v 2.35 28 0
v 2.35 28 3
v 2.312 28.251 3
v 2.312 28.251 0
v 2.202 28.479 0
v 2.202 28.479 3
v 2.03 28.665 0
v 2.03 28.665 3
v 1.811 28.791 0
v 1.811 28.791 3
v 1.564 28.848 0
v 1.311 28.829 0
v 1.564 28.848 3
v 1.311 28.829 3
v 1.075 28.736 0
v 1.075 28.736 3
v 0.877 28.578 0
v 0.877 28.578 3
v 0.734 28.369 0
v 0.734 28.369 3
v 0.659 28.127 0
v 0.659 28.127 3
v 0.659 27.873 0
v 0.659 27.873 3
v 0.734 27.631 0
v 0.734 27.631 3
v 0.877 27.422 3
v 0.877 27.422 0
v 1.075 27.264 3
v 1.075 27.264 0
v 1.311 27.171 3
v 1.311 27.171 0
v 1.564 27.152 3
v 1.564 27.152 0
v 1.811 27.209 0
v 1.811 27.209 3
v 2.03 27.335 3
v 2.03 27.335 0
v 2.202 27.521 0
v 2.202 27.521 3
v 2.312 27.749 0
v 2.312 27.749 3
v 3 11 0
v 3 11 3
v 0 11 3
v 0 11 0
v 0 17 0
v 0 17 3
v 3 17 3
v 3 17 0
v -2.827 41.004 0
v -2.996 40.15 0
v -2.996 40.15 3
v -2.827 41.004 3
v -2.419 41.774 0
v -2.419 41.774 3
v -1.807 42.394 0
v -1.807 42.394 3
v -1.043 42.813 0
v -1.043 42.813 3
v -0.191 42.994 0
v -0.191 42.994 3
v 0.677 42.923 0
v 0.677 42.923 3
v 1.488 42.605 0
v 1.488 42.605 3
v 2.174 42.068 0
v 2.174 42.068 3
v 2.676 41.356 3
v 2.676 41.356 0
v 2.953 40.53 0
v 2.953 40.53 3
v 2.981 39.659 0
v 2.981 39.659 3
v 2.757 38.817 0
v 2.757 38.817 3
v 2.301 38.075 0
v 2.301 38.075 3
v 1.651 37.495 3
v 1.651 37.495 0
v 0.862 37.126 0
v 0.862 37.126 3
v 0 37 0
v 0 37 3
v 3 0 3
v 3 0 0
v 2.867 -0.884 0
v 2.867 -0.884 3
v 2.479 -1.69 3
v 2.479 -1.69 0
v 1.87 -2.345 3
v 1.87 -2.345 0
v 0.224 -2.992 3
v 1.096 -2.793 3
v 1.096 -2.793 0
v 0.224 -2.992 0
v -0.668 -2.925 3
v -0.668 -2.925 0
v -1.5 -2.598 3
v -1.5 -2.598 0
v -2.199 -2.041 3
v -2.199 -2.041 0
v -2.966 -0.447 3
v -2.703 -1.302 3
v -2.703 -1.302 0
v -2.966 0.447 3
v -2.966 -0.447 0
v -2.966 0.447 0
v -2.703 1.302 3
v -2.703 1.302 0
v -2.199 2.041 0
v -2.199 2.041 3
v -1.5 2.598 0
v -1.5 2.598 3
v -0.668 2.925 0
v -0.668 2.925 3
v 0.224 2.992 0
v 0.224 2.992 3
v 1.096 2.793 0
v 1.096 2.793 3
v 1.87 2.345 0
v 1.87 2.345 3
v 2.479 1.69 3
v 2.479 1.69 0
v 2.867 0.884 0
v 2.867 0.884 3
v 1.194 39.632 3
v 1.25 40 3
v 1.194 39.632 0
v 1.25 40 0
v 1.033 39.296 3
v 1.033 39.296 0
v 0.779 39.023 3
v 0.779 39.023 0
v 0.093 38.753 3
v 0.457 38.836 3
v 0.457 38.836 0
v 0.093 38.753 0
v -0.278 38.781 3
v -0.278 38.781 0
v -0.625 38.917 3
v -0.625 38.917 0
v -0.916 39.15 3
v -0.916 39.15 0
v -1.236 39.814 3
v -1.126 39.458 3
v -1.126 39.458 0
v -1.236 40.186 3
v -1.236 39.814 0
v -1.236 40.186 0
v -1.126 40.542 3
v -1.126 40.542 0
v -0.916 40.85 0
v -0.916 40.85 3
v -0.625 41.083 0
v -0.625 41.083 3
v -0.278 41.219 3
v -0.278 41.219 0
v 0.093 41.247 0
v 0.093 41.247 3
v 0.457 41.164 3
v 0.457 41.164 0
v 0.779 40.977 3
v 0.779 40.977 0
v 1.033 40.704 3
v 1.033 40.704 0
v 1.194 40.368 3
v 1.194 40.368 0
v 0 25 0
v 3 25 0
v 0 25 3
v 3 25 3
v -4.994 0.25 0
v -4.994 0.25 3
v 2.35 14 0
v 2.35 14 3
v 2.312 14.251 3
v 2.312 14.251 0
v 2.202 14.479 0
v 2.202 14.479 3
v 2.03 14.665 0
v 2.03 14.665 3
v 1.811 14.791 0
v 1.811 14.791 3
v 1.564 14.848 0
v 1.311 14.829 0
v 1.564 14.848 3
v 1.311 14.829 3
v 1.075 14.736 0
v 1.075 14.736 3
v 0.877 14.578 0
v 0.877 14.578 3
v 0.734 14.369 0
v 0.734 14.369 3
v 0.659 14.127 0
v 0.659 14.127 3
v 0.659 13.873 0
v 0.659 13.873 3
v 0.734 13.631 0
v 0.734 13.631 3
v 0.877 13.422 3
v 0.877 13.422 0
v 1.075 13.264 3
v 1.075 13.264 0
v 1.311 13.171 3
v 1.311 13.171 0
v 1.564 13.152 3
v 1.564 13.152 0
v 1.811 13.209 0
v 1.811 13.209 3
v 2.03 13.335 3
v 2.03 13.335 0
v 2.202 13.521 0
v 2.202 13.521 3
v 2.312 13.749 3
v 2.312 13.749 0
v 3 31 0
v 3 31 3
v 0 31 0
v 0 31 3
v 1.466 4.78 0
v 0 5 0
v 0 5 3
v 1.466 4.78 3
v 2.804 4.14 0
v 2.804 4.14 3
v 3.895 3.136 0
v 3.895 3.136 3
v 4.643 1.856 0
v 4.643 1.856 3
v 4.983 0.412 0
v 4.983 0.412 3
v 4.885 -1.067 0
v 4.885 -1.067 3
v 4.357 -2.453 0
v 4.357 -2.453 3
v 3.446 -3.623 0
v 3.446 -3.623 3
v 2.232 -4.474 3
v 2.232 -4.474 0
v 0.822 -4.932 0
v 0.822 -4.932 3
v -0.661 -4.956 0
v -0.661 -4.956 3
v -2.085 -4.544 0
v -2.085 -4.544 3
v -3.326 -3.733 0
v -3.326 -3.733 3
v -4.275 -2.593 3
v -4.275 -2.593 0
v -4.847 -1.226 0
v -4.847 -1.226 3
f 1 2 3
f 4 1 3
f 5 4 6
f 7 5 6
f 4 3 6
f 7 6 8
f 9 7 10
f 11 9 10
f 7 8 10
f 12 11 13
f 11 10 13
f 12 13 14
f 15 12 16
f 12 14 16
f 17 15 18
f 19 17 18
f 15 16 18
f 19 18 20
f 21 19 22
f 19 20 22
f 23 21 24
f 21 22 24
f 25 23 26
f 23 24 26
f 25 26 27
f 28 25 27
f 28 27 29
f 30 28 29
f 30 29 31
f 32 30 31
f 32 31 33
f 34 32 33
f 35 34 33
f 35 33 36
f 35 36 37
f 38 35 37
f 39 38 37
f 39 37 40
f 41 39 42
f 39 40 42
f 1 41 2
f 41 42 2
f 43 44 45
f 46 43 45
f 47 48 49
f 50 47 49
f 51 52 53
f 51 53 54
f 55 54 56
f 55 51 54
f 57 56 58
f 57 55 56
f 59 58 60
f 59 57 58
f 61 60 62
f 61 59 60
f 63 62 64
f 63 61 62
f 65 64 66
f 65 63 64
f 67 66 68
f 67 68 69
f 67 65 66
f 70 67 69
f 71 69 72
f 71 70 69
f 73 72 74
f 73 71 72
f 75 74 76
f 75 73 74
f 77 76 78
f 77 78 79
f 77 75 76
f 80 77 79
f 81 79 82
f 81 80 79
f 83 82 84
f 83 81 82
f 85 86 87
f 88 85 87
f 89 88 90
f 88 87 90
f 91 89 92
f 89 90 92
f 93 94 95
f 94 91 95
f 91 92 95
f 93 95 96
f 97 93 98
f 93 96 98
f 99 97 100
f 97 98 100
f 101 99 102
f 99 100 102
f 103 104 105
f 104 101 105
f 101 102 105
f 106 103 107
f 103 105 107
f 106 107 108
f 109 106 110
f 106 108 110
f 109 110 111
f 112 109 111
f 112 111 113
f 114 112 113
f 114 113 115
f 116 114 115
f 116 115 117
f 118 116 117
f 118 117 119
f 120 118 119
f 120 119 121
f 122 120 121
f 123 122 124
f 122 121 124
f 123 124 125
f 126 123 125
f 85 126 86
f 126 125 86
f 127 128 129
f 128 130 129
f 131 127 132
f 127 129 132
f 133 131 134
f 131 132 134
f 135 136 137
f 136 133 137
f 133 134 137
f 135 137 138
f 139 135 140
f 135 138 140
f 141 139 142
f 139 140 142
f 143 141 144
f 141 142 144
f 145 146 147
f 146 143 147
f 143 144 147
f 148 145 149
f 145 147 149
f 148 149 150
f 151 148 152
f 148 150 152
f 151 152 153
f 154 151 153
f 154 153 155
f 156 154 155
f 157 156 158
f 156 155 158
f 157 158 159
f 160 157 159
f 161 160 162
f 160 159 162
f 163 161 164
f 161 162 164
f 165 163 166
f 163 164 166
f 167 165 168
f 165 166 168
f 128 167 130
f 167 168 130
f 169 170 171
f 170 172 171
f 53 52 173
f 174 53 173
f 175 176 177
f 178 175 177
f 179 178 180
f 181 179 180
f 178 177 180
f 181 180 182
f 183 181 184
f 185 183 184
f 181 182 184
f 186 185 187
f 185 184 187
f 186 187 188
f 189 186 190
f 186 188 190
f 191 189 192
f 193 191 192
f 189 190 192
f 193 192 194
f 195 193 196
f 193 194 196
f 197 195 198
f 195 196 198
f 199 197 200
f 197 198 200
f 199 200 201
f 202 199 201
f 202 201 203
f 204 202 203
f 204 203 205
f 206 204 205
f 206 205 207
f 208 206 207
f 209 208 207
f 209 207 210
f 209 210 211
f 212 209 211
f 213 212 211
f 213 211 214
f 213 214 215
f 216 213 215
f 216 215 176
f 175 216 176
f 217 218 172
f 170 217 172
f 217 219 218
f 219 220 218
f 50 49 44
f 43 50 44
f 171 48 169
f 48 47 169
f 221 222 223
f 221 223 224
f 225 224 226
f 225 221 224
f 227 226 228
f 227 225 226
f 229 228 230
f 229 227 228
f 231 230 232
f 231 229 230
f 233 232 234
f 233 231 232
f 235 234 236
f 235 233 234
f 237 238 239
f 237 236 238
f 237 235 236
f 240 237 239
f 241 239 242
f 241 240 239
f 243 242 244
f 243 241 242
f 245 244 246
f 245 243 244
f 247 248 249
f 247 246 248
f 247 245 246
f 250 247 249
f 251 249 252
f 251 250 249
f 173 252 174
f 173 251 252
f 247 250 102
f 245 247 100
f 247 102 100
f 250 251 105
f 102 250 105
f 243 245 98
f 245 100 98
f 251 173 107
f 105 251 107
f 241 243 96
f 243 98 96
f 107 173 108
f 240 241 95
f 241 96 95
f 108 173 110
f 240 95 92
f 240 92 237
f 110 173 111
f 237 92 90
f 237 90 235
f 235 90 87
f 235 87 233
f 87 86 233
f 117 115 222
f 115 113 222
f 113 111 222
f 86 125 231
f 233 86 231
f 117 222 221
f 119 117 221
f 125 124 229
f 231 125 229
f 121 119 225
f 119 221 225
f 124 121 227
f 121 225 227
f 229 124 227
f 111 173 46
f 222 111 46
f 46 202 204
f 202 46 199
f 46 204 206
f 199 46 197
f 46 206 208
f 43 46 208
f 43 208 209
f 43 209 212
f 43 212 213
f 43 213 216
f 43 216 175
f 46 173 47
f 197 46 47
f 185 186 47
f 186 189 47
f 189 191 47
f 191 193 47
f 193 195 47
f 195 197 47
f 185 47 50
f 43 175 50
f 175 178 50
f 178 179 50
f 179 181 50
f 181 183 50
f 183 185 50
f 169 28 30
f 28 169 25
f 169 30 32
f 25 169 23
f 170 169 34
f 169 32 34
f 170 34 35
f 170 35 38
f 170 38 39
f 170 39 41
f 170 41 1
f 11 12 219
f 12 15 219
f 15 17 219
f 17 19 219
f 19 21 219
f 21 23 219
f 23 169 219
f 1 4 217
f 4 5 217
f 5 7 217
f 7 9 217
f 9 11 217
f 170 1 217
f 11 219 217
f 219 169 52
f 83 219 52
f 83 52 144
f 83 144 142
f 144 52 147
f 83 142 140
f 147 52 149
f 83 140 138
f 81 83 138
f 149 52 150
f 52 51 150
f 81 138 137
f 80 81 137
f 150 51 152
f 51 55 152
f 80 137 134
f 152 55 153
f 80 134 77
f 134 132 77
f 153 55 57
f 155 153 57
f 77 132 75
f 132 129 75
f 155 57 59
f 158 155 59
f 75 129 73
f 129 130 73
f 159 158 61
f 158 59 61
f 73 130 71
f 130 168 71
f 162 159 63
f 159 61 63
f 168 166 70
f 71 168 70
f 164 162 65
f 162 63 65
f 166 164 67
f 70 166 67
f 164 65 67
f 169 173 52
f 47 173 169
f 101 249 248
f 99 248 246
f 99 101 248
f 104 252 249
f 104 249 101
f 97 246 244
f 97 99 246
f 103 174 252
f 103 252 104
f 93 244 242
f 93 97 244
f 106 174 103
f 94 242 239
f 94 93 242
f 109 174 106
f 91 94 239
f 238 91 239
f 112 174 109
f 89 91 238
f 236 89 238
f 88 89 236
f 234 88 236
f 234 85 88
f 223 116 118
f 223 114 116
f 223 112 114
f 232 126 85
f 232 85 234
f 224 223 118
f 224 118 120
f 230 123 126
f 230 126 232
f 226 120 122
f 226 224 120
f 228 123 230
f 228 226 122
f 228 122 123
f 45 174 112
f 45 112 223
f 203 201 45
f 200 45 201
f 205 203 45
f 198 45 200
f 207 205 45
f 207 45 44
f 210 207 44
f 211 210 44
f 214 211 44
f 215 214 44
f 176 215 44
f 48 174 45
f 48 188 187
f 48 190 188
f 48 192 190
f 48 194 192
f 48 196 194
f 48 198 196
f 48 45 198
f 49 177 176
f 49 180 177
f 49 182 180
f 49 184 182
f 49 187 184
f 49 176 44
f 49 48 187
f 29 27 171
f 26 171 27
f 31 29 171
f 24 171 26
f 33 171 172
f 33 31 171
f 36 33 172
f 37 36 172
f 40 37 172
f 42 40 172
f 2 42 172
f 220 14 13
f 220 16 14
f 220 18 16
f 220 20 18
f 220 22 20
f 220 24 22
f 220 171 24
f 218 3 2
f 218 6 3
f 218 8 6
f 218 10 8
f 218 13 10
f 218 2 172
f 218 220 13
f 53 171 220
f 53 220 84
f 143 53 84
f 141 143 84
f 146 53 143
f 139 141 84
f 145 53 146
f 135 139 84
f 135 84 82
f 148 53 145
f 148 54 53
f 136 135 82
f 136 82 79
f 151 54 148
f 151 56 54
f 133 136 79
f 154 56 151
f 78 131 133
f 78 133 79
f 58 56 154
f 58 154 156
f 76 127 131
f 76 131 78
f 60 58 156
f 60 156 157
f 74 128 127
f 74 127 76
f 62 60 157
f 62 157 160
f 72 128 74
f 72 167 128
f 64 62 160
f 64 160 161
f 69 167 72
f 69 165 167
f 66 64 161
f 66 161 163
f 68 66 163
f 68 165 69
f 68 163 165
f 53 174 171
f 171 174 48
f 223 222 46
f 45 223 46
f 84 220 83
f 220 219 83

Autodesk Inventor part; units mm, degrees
ref_plane "YZ Plane" through (0, 0, 0) normal (1, 0, 0) x (0, 1, 0)
ref_plane "XZ Plane" through (0, 0, 0) normal (0, 1, 0) x (-1, 0, 0)
ref_plane "XY Plane" through (0, 0, 0) normal (0, 0, 1) x (1, 0, 0)
sketch "スケッチ1" plane through (0, 0, 0) normal (0, 0, 1) x (1, 0, 0)
  circle A0 centre (0, 0) radius 3
  circle A1 centre (0, 40) radius 1.25
  circle A2 centre (0, 40) radius 3
  circle A3 centre (0, 0) radius 5
  line L0 (0, 5) -> (0, 37)
  line L1 (-2.9962, 40.15) -> (-4.9937, 0.25)
  dimension "d0" = 6
  dimension "d1" = 2.5
  dimension "d2" = 40
  dimension "d3" = 6
  dimension "d4" = 10
extrude "押し出し1" add sketch "スケッチ1" along normal blind 3
sketch "スケッチ2" plane through (0, 0, 3) normal (0, 0, 1) x (1, 0, 0)
  circle A0 centre (0, 0) radius 3 projected
  circle A1 centre (0, 40) radius 1.25 projected
  arc A2 (0, 37) -> (-2.9962, 40.15) centre (0, 40) ccw projected
  line L0 (-2.9962, 40.15) -> (-4.9937, 0.25) projected
  arc A3 (-4.9937, 0.25) -> (0, 5) centre (0, 0) ccw projected
  line L1 (0, 5) -> (0, 37) projected
  circle A4 centre (0, 0) radius 3
  circle A5 centre (-32.1289, 23.8272) radius 1.25
  line L2 (-4.0161, 2.9784) -> (-4.827, 3.5798)
  arc A6 (-30.4645, 26.3232) -> (-29.7192, 22.0402) centre (-32.1289, 23.8272) ccw
  line L3 (-4.5534, 9.0458) -> (2.7739, 4.16)
  arc A7 (-4.0161, 2.9784) -> (2.7739, 4.16) centre (0, 0) ccw
extrude "押し出し2" [suppressed]
sketch "スケッチ4" plane through (0, 0, 3) normal (0, 0, 1) x (1, 0, 0)
  line L0 (-4.9937, 0.25) -> (-2.9962, 40.15) projected
  arc A0 (0, 37) -> (-2.9962, 40.15) centre (0, 40) ccw projected
  line L1 (0, 37) -> (0, 5) projected
  circle A1 centre (0, 40) radius 1.25 projected
  circle A2 centre (-27.9404, 11.376) radius 3
  circle A3 centre (0, 40) radius 1.25
  line L2 (-3.1661, 36.7564) -> (-2.0955, 37.8532)
  arc A4 (2.2489, 38.0144) -> (-2.0955, 37.8532) centre (0, 40) ccw
  line L3 (2.2489, 38.0144) -> (-3.4249, 31.5882)
  arc A5 (-24.4479, 14.954) -> (-24.1923, 8.0667) centre (-27.9404, 11.376) ccw
  circle A6 centre (0, 0) radius 3 projected
  arc A7 (-4.9937, 0.25) -> (0, 5) centre (0, 0) ccw projected
extrude "押し出し3" [suppressed]
sketch "スケッチ5" plane through (0, 0, 3) normal (0, 0, 1) x (1, 0, 0)
  circle A0 centre (0, 0) radius 3 projected
  circle A1 centre (0, 40) radius 1.25 projected
  arc A2 (0, 37) -> (-2.9962, 40.15) centre (0, 40) ccw projected
  line L0 (-2.9962, 40.15) -> (-4.9937, 0.25) projected
  arc A3 (-4.9937, 0.25) -> (0, 5) centre (0, 0) ccw projected
  line L1 (0, 5) -> (0, 37) projected
  line L2 (0, 31) -> (3, 31)
  line L3 (3, 31) -> (3, 25)
  line L4 (3, 25) -> (0, 25)
  line L5 (0, 17) -> (3, 17)
  line L6 (3, 17) -> (3, 11)
  line L7 (3, 11) -> (0, 11)
  circle A4 centre (1.5, 14) radius 0.85
  circle A5 centre (1.5, 28) radius 0.85
  point P0 (1.5, 31)
  point P1 (1.5, 17)
  point P2 (3, 28)
  point P3 (3, 14)
  dimension "d12" = 6
  dimension "d13" = 3
  dimension "d14" = 8
  dimension "d15" = 6
  dimension "d16" = 6
  dimension "d19" = 1.7
extrude "押し出し4" add sketch "スケッチ5" against normal blind 3 contours L2 L3 L4 L1 | L5 L6 L7 L1
equation "\"d15\" = d16"
properties part number "link1"
